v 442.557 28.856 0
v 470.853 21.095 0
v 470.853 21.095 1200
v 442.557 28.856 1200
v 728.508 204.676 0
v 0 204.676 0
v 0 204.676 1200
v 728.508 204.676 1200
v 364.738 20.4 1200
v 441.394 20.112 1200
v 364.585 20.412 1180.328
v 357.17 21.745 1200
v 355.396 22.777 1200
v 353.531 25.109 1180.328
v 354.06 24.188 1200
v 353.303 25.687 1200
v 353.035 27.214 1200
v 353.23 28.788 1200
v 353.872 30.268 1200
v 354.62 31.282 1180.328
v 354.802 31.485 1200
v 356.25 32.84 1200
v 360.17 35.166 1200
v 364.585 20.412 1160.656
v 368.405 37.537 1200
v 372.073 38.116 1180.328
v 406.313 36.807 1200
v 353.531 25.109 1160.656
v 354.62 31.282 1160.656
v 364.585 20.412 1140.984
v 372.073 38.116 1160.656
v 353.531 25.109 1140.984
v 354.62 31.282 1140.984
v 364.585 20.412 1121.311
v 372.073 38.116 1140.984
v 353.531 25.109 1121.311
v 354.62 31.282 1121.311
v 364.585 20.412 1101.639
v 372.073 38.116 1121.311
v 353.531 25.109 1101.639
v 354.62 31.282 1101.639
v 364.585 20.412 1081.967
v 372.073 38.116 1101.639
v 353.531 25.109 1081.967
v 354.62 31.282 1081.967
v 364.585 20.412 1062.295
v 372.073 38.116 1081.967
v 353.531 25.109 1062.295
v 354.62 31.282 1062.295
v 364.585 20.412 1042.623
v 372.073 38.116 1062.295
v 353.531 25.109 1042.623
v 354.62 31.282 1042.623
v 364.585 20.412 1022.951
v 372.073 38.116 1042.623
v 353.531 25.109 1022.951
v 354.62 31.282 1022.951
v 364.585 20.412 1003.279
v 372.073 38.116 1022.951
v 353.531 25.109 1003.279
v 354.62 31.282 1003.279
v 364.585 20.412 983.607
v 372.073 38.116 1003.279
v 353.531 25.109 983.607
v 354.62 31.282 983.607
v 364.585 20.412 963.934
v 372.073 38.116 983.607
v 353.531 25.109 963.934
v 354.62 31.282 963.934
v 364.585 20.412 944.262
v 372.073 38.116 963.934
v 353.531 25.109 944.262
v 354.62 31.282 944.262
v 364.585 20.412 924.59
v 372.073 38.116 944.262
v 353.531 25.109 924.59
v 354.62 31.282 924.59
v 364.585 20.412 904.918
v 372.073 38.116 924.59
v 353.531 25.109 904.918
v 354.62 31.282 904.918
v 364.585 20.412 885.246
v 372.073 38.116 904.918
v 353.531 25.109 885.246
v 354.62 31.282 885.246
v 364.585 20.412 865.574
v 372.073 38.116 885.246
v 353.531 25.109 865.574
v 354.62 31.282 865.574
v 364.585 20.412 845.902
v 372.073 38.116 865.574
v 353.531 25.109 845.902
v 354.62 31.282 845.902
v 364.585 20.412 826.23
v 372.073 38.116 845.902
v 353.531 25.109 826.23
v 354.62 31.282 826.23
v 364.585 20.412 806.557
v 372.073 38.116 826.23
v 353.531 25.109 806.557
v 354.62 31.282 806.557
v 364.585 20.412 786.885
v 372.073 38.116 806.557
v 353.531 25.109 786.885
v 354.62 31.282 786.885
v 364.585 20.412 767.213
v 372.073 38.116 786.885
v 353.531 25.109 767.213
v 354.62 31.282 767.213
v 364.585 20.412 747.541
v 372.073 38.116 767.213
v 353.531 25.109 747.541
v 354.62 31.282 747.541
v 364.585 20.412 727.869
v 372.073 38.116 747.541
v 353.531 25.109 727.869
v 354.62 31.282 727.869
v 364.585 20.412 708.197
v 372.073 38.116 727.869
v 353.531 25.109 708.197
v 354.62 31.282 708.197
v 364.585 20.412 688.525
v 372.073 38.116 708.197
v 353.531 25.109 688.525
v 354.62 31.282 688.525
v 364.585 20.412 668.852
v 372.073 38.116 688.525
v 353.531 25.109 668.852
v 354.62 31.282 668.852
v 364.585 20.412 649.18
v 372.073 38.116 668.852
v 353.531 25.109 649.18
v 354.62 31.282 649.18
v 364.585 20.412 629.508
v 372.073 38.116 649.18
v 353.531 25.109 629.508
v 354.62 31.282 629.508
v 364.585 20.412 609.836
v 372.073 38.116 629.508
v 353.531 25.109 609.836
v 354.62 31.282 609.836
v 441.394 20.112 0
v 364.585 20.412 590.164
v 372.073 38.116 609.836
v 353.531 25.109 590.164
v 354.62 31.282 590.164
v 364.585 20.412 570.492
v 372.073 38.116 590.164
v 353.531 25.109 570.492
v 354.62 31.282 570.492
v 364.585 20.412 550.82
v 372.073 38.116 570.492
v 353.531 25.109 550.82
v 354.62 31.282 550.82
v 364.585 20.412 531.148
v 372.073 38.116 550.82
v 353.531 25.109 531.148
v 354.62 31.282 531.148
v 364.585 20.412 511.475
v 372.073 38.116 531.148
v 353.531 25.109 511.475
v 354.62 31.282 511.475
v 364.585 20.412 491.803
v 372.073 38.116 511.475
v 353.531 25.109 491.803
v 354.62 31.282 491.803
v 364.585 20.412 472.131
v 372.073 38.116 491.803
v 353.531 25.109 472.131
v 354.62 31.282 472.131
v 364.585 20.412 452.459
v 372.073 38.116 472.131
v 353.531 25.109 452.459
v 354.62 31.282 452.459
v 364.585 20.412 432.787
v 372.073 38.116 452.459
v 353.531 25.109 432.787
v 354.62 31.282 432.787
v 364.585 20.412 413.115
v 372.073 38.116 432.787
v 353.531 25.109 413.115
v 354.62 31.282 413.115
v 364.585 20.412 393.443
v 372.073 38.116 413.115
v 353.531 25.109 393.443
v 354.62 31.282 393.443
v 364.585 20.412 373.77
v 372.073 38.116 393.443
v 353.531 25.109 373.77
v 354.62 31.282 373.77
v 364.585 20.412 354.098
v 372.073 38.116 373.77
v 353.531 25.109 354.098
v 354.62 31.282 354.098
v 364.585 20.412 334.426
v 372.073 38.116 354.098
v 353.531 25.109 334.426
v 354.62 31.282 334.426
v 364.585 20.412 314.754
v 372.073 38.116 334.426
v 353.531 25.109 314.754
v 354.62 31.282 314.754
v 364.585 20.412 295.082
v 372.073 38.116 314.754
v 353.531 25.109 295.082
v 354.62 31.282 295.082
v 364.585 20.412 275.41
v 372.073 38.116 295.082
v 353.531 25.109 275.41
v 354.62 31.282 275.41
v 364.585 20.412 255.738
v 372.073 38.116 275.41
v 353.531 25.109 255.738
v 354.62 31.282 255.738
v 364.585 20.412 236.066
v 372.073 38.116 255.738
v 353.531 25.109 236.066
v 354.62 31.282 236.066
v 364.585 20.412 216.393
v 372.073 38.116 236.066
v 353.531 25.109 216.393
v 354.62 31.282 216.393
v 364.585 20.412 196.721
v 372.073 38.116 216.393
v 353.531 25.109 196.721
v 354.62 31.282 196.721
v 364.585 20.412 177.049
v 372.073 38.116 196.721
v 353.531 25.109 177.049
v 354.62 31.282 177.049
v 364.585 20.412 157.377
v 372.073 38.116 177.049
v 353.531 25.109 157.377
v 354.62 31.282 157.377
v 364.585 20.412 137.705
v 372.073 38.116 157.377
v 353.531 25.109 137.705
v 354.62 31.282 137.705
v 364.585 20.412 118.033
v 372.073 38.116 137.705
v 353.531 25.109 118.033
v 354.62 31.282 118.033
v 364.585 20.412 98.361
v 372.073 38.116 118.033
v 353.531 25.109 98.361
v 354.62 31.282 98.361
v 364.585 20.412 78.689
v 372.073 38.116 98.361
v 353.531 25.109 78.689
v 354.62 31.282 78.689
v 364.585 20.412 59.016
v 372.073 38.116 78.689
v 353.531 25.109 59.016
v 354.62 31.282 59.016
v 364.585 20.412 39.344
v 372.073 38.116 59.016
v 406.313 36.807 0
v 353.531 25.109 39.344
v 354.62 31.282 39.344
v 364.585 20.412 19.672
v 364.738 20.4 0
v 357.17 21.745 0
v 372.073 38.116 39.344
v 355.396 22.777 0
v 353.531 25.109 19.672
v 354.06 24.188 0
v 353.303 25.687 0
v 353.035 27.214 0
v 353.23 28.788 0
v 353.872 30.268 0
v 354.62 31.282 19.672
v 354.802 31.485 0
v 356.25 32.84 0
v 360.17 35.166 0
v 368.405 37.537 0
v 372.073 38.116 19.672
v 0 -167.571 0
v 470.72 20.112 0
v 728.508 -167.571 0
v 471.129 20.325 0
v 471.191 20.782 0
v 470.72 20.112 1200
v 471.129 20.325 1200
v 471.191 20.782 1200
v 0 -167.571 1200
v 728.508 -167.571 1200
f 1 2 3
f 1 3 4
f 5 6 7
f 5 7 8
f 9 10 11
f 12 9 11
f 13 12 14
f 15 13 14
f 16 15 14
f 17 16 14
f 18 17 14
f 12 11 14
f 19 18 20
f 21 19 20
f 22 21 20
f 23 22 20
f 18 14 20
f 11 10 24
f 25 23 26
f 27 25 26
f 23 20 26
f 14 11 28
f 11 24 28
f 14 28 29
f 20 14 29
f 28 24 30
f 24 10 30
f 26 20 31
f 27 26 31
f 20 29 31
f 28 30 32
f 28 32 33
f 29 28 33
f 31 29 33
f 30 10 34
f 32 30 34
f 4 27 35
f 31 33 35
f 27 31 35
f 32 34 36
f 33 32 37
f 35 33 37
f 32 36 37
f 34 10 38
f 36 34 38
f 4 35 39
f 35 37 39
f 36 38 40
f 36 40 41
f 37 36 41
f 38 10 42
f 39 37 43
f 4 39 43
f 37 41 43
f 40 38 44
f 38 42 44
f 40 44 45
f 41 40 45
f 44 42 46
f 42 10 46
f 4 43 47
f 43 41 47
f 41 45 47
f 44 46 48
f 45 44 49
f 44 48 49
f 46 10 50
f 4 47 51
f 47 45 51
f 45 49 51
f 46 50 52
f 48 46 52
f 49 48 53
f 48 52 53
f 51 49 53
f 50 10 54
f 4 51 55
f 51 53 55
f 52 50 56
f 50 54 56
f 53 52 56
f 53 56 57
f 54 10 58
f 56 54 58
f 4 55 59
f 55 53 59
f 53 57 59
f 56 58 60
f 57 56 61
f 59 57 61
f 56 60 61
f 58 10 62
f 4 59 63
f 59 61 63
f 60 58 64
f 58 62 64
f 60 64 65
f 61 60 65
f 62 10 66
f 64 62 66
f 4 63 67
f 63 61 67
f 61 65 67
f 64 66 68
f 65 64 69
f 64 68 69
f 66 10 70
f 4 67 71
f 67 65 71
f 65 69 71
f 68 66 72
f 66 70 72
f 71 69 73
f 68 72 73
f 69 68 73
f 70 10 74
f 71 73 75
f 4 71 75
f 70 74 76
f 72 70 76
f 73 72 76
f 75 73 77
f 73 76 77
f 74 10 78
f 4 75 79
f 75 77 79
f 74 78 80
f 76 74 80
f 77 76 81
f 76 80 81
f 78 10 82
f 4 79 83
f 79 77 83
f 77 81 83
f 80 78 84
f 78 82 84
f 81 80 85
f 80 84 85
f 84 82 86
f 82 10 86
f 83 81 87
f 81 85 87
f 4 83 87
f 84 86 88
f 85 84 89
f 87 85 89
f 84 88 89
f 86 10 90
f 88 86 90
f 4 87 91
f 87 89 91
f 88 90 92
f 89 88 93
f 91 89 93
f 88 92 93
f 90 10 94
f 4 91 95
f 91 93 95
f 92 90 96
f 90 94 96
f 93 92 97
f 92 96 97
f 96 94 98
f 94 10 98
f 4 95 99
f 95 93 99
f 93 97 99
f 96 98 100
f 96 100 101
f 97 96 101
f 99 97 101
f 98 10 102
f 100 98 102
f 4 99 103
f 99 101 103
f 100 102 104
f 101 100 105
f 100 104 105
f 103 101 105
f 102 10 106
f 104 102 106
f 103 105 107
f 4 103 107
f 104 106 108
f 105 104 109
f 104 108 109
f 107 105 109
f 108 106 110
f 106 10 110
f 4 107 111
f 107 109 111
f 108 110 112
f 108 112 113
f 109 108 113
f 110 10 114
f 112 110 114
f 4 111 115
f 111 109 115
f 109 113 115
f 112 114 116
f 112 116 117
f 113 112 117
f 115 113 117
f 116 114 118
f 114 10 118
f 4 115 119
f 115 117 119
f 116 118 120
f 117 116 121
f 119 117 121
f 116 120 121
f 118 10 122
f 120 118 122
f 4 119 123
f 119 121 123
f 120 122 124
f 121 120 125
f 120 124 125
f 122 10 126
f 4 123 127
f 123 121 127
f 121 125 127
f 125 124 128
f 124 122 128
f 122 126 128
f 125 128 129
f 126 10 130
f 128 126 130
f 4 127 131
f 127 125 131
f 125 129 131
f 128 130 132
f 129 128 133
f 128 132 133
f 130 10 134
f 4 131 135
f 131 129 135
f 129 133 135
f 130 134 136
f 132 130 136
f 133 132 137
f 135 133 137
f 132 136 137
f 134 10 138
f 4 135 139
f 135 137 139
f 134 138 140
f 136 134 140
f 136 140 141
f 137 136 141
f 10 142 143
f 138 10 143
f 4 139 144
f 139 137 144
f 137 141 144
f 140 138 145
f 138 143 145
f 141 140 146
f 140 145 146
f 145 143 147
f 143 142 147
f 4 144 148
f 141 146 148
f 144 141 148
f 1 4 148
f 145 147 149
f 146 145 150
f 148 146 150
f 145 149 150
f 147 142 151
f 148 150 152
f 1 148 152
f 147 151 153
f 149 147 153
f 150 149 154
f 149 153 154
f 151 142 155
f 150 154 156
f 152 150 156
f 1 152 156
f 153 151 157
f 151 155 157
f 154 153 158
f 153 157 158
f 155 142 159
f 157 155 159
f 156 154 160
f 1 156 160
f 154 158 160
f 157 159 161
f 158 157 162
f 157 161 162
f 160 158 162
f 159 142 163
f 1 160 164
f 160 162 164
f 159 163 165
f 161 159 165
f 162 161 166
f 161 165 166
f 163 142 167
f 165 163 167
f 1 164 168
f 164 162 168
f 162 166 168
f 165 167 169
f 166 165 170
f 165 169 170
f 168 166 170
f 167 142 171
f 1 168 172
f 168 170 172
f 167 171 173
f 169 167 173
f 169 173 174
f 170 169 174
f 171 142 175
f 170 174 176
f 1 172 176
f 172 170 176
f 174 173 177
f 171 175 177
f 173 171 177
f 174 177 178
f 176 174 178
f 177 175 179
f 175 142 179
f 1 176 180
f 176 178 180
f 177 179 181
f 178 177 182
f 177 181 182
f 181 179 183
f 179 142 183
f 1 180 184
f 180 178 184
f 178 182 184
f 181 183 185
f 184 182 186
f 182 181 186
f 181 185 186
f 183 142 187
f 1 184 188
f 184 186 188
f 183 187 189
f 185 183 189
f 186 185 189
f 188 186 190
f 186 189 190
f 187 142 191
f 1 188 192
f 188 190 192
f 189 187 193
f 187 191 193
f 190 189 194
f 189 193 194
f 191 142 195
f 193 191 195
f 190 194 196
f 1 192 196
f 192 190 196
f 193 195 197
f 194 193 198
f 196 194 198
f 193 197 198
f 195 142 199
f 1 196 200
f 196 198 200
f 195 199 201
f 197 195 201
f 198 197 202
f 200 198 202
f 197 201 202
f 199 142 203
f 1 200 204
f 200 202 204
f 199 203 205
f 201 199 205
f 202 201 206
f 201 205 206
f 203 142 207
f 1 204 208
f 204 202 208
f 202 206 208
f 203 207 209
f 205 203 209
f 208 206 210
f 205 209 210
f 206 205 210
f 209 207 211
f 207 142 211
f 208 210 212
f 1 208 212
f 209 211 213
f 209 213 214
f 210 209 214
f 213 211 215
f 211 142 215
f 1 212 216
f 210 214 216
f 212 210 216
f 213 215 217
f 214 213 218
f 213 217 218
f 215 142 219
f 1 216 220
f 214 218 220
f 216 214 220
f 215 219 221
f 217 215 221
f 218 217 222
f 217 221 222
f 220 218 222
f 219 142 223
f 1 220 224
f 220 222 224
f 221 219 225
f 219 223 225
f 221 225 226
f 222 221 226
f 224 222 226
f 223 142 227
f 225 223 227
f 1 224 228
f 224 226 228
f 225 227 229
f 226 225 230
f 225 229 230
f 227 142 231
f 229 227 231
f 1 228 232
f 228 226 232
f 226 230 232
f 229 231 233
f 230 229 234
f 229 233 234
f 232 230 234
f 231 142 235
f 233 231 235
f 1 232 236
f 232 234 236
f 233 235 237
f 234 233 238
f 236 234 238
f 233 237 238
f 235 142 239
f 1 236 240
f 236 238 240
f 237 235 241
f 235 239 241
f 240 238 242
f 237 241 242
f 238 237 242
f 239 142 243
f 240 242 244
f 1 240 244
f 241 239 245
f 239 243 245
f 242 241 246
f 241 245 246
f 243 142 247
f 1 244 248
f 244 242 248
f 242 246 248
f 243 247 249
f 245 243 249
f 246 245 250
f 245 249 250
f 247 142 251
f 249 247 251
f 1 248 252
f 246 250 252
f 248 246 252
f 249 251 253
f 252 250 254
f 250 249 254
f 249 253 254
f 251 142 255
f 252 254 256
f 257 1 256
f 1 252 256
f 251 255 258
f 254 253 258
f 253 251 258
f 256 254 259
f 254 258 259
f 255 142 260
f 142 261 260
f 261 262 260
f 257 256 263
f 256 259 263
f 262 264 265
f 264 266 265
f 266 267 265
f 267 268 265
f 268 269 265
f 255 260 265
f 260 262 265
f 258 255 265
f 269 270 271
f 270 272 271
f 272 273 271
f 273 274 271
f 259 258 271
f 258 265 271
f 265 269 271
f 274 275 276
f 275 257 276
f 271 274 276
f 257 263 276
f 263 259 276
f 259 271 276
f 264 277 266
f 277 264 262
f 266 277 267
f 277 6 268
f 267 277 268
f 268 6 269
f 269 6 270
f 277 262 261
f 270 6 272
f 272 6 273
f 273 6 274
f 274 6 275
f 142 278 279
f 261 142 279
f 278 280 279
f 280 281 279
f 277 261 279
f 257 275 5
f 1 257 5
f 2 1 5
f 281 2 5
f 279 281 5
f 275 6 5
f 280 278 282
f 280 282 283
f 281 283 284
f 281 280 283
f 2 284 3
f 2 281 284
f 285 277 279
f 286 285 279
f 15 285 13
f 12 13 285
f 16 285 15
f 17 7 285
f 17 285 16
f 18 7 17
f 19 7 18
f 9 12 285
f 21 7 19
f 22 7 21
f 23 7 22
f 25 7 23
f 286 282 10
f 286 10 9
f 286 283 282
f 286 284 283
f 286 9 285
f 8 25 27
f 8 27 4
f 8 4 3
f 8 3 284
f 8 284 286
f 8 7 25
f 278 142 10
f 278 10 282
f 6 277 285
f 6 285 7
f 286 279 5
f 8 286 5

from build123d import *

# Parameters (mm, degrees)
SKETCH1_W           = 728.507712526
SKETCH1_H           = 372.247612808
BOSS_EXTRUDE1_DEPTH = 1200


with BuildPart() as part:
    # Sketch1 → Boss-Extrude1 (new body)
    with BuildSketch(Plane.XY):
        with Locations((364.253856263, 18.552453849)):
            Rectangle(SKETCH1_W, SKETCH1_H)
        with BuildLine():
            Line((441.393772372, 20.11245238), (470.720248748, 20.11245238))
            ThreePointArc((470.720248748, 20.11245238), (471.215775755, 20.545721687), (470.85251619, 21.094640438))
            Line((470.85251619, 21.094640438), (442.557049848, 28.856277993))
            add(Edge.make_bspline(
                [(441.393772372, 20.11245238), (437.816630749, 20.105643074), (430.662185952, 20.093254902), (419.931476298, 20.073638873), (410.989397892, 20.05802128), (403.835453794, 20.044763259), (398.470497743, 20.035035638), (393.10446141, 20.024425958), (387.735021397, 20.017659911), (383.274859524, 20.009444007), (379.696108674, 19.996368347), (376.991001378, 19.994447782), (374.271249485, 20.010918971), (371.530679735, 20.056360098), (369.228950932, 20.131407076), (367.378711377, 20.219984968), (365.978183778, 20.304620288), (364.578709921, 20.410081097), (363.214024728, 20.526416591), (361.971898146, 20.65201194), (360.904853145, 20.805577699), (360.069783324, 20.956248021), (359.288045988, 21.130261844), (358.640116289, 21.281010932), (357.765467063, 21.506816056), (356.839748986, 21.871835881), (356.055967315, 22.286834279), (355.325142217, 22.811112843), (354.788881726, 23.301715107), (354.347839516, 23.793022868), (353.998210399, 24.262418144), (353.695602528, 24.752886461), (353.365330175, 25.450623284), (353.111643283, 26.298326889), (352.961298812, 27.649941627), (353.227738955, 28.932944297), (353.586282933, 29.767186255), (353.964999314, 30.449203447), (354.389957132, 31.025585157), (354.855699671, 31.552849553), (355.354503463, 32.044209503), (355.820762746, 32.475335753), (356.552615658, 33.103064875), (357.389050585, 33.706898074), (358.216447641, 34.21460014), (359.287698264, 34.784145271), (360.572839349, 35.352857227), (362.056434922, 35.895767331), (363.479940401, 36.349485655), (364.908429326, 36.753895892), (366.827818433, 37.231436262), (369.210683302, 37.706967221), (372.066182641, 38.140016342), (374.963490259, 38.431919098), (378.7767391, 38.631004567), (383.377043684, 38.645396216), (388.865337546, 38.535909849), (394.412818539, 38.20453267), (401.720197274, 37.488657384), (410.779849111, 36.19753981), (421.486806006, 34.110578028), (432.09991262, 31.671596216), (439.072672673, 29.812066189), (442.557049848, 28.856277993)],
                knots=[0, 0, 0, 0, 0.062498476, 0.124996951, 0.187495427, 0.218744665, 0.249993902, 0.28124314, 0.312492378, 0.343741616, 0.359366235, 0.374990854, 0.390615473, 0.406240092, 0.42186471, 0.42967702, 0.437489329, 0.445301639, 0.453113948, 0.460926258, 0.464832412, 0.468738567, 0.472644722, 0.476550877, 0.480457031, 0.482410109, 0.484363186, 0.486316263, 0.488269341, 0.48924588, 0.490222418, 0.491198957, 0.492175496, 0.493152034, 0.494128573, 0.49608165, 0.497058189, 0.498034728, 0.499987805, 0.501940882, 0.50389396, 0.507800114, 0.511706269, 0.515612424, 0.519518579, 0.523424733, 0.531237043, 0.539049352, 0.546861662, 0.554673971, 0.562486281, 0.5781109, 0.593735518, 0.609360137, 0.624984756, 0.656233994, 0.687483232, 0.71873247, 0.749981707, 0.812480183, 0.874978659, 0.937477134, 0.99997561, 0.99997561, 0.99997561, 0.99997561], degree=3))
        make_face(mode=Mode.SUBTRACT)
    extrude(amount=BOSS_EXTRUDE1_DEPTH)


solid = part.part
